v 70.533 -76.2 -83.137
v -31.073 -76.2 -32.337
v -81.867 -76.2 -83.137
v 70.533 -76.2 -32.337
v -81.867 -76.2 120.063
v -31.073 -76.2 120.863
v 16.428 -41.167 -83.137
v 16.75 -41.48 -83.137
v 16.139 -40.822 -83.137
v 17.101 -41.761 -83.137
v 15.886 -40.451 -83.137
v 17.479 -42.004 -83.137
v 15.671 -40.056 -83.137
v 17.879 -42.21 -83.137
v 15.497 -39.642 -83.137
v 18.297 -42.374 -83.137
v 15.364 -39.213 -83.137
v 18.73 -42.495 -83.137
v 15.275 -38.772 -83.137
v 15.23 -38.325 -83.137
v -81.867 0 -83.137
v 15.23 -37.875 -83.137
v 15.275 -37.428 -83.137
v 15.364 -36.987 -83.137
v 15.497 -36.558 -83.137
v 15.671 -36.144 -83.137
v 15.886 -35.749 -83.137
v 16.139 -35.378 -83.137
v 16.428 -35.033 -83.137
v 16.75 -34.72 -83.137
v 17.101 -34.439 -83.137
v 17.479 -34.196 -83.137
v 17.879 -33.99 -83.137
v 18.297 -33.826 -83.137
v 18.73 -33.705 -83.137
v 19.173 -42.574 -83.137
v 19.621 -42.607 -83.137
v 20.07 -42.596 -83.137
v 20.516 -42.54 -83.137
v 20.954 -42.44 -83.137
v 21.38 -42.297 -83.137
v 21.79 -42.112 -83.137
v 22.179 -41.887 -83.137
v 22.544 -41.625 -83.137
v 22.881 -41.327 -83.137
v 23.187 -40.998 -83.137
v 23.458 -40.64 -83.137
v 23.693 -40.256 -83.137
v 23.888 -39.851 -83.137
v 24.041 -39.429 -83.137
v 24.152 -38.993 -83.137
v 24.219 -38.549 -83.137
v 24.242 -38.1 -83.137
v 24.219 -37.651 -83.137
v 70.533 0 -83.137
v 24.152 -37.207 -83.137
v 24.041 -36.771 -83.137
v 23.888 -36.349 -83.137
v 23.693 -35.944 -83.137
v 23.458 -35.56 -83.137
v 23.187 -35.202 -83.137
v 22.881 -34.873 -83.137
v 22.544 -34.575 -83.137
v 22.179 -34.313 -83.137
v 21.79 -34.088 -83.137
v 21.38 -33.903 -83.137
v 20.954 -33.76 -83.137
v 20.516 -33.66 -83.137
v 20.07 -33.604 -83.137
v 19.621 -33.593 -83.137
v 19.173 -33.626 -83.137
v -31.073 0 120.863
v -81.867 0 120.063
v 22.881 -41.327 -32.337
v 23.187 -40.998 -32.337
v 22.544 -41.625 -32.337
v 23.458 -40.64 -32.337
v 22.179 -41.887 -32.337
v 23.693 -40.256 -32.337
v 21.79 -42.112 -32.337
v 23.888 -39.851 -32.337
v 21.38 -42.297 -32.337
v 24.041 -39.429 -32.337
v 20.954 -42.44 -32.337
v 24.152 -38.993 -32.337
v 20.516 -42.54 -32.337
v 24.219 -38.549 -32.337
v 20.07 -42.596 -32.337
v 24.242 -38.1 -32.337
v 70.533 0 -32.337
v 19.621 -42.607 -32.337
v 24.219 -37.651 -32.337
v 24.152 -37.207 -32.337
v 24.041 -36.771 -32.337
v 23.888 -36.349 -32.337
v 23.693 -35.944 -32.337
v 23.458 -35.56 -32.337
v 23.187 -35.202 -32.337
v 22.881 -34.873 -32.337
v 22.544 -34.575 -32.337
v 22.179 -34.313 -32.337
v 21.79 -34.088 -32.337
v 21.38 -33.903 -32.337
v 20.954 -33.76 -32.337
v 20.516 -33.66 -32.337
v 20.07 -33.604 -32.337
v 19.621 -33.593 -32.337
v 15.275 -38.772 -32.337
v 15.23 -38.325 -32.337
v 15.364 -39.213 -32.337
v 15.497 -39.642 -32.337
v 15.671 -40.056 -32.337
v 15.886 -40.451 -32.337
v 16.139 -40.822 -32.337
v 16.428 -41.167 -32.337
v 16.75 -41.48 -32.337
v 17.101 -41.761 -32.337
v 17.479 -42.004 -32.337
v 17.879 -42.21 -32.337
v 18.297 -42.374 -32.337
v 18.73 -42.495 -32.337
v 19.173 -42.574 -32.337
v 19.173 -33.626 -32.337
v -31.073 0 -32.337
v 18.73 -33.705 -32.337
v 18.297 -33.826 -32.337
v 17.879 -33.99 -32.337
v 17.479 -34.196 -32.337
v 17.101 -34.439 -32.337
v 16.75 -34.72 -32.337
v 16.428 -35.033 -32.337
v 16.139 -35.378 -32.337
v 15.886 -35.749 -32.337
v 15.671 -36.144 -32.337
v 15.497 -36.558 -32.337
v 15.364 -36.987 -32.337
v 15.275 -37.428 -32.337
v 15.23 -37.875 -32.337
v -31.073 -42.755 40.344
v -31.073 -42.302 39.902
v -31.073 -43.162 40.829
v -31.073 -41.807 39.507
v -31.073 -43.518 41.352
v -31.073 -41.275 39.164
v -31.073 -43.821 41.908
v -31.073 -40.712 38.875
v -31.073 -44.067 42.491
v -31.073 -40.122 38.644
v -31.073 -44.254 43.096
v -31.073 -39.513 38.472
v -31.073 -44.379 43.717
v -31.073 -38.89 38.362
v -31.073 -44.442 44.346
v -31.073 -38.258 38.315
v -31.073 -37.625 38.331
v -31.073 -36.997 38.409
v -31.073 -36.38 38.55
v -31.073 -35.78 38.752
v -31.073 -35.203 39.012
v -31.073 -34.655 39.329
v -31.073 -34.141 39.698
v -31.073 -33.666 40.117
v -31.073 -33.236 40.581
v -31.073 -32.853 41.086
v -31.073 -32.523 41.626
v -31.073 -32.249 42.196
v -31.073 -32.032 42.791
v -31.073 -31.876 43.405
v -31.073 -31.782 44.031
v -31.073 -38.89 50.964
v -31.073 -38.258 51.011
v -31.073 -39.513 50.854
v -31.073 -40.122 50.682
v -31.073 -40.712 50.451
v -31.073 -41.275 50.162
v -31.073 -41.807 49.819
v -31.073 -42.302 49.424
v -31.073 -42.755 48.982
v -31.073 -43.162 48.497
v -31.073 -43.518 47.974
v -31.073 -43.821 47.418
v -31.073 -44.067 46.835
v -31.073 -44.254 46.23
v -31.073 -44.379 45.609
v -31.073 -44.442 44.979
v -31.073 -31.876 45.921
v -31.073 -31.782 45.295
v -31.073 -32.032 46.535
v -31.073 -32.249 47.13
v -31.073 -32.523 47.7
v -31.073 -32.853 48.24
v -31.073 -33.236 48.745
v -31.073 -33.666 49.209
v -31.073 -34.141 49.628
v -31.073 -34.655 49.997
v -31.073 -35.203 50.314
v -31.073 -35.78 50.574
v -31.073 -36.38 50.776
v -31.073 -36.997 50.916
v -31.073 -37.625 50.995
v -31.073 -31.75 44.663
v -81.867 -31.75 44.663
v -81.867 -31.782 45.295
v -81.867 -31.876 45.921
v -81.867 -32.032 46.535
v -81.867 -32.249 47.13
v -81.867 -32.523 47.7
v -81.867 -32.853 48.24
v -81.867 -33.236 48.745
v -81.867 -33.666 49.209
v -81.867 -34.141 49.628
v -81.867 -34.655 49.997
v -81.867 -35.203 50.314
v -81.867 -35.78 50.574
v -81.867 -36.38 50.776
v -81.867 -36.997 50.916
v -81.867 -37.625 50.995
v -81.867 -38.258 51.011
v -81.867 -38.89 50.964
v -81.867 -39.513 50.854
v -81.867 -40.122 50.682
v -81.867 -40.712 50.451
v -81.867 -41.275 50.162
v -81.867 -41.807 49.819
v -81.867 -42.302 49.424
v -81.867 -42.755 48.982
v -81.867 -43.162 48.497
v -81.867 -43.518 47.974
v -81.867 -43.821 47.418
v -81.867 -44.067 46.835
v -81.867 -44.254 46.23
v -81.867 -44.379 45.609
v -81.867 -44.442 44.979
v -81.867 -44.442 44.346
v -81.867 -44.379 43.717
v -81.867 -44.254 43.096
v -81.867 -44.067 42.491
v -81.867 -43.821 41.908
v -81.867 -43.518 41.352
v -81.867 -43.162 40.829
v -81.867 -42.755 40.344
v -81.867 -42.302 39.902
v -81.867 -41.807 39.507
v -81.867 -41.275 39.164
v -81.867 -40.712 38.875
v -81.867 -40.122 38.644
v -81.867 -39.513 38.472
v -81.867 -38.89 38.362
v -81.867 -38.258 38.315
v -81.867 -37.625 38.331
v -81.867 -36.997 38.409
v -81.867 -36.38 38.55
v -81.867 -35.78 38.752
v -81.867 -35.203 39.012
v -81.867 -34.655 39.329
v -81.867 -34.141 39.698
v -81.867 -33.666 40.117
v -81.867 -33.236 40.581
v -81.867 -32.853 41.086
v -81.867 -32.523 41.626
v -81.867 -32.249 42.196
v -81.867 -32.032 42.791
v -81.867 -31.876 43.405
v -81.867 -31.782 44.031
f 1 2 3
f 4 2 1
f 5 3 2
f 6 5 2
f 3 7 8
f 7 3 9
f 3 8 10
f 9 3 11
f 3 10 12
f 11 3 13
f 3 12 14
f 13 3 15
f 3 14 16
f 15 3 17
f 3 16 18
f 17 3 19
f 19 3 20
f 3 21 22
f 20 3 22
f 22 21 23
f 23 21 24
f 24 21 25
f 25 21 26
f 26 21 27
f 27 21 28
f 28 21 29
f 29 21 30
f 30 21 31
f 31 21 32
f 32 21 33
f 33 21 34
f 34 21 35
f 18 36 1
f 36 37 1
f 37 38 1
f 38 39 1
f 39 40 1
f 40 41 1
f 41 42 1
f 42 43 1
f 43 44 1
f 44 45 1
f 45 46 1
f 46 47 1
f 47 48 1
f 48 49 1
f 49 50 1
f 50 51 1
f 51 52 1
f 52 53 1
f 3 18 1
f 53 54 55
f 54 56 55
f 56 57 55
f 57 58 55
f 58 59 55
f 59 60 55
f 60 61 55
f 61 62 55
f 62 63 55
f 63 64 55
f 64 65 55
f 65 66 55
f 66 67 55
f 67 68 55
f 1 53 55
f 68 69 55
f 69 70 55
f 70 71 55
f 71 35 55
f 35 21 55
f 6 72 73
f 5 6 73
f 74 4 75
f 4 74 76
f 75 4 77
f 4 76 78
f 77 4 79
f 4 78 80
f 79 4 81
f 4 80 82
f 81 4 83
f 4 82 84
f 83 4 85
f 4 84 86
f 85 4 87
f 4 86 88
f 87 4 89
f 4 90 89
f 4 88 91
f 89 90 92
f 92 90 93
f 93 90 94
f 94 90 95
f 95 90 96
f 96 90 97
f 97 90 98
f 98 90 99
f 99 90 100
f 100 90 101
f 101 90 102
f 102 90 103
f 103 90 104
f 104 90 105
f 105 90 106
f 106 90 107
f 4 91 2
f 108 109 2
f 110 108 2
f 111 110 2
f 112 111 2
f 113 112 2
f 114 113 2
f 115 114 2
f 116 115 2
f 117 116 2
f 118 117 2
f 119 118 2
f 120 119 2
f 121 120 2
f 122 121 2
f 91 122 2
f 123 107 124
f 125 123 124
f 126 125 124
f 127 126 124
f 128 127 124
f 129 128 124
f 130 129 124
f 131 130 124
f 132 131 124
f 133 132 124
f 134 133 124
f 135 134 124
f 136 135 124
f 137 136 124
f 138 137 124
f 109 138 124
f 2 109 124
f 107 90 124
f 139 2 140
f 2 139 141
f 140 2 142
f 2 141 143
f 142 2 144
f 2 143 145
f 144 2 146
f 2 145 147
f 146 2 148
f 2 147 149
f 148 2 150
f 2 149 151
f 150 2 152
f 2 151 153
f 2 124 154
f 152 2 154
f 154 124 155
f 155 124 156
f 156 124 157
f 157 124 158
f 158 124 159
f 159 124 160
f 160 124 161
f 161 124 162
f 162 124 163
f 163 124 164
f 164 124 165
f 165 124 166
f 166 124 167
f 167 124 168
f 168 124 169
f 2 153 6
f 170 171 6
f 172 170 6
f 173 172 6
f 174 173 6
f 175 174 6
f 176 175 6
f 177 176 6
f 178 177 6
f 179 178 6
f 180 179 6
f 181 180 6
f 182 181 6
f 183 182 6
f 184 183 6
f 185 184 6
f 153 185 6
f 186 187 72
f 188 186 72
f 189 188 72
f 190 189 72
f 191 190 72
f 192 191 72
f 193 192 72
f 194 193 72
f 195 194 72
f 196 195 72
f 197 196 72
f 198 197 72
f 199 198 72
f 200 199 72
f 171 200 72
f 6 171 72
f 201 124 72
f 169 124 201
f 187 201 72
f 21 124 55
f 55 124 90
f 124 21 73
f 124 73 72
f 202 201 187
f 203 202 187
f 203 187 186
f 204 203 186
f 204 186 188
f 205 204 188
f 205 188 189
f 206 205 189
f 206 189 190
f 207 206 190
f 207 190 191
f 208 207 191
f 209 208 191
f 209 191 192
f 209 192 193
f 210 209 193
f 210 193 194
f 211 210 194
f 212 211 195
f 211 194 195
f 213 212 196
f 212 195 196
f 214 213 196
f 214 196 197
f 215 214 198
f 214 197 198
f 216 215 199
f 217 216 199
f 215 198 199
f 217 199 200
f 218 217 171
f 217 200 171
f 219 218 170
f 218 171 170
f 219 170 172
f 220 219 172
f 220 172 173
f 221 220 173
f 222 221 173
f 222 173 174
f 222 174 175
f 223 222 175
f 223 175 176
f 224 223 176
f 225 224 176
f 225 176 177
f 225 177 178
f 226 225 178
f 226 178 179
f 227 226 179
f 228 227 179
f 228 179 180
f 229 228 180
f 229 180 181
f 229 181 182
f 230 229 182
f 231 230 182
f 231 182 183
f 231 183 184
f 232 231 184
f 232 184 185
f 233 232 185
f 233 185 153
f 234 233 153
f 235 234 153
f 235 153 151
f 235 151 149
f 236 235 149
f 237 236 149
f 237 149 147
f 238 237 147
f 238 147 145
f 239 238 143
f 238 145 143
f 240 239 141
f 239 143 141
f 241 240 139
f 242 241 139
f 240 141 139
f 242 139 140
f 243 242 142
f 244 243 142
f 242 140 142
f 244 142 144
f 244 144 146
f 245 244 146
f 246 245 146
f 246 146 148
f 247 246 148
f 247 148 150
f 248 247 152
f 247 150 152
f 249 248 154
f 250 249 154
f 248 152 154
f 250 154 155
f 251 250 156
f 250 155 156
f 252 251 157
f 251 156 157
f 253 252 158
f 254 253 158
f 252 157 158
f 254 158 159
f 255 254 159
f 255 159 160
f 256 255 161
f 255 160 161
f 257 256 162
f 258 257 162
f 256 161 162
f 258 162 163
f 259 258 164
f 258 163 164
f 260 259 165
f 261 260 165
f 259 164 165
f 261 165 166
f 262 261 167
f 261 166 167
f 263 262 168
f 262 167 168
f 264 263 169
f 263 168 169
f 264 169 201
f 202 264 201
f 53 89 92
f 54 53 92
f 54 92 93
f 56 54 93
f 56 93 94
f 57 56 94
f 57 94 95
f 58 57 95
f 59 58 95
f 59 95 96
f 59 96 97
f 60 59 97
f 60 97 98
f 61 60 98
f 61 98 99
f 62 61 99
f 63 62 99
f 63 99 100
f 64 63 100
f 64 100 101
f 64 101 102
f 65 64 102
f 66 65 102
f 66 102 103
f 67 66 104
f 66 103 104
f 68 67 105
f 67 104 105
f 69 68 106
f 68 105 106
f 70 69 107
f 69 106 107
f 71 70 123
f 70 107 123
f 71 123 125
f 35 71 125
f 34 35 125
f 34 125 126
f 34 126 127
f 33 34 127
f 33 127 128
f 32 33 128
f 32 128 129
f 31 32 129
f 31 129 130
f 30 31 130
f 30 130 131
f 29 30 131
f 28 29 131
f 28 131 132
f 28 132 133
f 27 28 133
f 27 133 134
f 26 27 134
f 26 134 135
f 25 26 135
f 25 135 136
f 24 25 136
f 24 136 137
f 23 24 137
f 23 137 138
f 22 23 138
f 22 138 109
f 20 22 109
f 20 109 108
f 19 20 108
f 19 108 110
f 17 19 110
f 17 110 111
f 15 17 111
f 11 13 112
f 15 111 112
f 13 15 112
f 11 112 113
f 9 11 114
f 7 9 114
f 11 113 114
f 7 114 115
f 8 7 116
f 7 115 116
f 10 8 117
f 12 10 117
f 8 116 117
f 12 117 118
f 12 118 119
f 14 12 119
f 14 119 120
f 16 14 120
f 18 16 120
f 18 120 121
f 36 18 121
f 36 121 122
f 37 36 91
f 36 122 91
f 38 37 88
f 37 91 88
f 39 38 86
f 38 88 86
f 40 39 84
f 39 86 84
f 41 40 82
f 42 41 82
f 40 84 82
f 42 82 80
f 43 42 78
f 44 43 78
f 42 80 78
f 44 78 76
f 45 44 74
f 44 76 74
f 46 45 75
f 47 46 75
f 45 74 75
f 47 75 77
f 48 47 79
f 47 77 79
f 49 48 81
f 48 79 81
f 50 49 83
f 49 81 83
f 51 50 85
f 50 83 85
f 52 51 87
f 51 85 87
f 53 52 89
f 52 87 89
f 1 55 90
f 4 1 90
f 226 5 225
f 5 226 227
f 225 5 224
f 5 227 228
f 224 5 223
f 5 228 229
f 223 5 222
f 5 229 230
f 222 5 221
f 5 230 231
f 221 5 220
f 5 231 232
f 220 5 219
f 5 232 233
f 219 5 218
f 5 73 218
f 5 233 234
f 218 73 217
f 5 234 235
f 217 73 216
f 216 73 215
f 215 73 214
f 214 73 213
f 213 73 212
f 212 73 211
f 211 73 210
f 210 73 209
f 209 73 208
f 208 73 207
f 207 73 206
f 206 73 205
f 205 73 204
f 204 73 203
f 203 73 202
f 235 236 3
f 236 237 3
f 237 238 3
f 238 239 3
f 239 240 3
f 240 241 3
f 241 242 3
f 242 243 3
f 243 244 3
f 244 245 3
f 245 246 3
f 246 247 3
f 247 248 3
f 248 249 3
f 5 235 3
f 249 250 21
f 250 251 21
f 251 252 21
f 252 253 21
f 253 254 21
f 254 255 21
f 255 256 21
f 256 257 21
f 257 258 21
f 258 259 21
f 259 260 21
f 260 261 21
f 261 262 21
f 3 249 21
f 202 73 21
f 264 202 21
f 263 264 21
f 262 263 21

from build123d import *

# Parameters (mm, degrees)
F1_DEPTH = 76.2
F2_R     = 6.35
F3_DEPTH = 200.038046
F4_R     = 4.5085
F5_DEPTH = 416.492134


with BuildPart() as f1:
    # F0 (on Front) → F1 (new body)
    with BuildSketch(Plane.XZ):
        Polygon((-31.073093, 120.862948), (-81.866795, 120.063045), (-81.866795, -83.136955), (70.533205, -83.136955), (70.533205, -32.336955), (-31.073093, -32.336955), align=None)
    extrude(amount=F1_DEPTH)

    # F2 (on Right) → F3 (cut)
    with BuildSketch(Plane.YZ):
        with Locations((-38.1, 44.662948)):
            Circle(F2_R)
    extrude(amount=-F3_DEPTH, mode=Mode.SUBTRACT)

    # F4 (on Top) → F5 (cut)
    with BuildSketch(Plane.XY):
        with Locations((19.733205, -38.1)):
            Circle(F4_R)
    extrude(amount=-F5_DEPTH, mode=Mode.SUBTRACT)


solid = f1.part
